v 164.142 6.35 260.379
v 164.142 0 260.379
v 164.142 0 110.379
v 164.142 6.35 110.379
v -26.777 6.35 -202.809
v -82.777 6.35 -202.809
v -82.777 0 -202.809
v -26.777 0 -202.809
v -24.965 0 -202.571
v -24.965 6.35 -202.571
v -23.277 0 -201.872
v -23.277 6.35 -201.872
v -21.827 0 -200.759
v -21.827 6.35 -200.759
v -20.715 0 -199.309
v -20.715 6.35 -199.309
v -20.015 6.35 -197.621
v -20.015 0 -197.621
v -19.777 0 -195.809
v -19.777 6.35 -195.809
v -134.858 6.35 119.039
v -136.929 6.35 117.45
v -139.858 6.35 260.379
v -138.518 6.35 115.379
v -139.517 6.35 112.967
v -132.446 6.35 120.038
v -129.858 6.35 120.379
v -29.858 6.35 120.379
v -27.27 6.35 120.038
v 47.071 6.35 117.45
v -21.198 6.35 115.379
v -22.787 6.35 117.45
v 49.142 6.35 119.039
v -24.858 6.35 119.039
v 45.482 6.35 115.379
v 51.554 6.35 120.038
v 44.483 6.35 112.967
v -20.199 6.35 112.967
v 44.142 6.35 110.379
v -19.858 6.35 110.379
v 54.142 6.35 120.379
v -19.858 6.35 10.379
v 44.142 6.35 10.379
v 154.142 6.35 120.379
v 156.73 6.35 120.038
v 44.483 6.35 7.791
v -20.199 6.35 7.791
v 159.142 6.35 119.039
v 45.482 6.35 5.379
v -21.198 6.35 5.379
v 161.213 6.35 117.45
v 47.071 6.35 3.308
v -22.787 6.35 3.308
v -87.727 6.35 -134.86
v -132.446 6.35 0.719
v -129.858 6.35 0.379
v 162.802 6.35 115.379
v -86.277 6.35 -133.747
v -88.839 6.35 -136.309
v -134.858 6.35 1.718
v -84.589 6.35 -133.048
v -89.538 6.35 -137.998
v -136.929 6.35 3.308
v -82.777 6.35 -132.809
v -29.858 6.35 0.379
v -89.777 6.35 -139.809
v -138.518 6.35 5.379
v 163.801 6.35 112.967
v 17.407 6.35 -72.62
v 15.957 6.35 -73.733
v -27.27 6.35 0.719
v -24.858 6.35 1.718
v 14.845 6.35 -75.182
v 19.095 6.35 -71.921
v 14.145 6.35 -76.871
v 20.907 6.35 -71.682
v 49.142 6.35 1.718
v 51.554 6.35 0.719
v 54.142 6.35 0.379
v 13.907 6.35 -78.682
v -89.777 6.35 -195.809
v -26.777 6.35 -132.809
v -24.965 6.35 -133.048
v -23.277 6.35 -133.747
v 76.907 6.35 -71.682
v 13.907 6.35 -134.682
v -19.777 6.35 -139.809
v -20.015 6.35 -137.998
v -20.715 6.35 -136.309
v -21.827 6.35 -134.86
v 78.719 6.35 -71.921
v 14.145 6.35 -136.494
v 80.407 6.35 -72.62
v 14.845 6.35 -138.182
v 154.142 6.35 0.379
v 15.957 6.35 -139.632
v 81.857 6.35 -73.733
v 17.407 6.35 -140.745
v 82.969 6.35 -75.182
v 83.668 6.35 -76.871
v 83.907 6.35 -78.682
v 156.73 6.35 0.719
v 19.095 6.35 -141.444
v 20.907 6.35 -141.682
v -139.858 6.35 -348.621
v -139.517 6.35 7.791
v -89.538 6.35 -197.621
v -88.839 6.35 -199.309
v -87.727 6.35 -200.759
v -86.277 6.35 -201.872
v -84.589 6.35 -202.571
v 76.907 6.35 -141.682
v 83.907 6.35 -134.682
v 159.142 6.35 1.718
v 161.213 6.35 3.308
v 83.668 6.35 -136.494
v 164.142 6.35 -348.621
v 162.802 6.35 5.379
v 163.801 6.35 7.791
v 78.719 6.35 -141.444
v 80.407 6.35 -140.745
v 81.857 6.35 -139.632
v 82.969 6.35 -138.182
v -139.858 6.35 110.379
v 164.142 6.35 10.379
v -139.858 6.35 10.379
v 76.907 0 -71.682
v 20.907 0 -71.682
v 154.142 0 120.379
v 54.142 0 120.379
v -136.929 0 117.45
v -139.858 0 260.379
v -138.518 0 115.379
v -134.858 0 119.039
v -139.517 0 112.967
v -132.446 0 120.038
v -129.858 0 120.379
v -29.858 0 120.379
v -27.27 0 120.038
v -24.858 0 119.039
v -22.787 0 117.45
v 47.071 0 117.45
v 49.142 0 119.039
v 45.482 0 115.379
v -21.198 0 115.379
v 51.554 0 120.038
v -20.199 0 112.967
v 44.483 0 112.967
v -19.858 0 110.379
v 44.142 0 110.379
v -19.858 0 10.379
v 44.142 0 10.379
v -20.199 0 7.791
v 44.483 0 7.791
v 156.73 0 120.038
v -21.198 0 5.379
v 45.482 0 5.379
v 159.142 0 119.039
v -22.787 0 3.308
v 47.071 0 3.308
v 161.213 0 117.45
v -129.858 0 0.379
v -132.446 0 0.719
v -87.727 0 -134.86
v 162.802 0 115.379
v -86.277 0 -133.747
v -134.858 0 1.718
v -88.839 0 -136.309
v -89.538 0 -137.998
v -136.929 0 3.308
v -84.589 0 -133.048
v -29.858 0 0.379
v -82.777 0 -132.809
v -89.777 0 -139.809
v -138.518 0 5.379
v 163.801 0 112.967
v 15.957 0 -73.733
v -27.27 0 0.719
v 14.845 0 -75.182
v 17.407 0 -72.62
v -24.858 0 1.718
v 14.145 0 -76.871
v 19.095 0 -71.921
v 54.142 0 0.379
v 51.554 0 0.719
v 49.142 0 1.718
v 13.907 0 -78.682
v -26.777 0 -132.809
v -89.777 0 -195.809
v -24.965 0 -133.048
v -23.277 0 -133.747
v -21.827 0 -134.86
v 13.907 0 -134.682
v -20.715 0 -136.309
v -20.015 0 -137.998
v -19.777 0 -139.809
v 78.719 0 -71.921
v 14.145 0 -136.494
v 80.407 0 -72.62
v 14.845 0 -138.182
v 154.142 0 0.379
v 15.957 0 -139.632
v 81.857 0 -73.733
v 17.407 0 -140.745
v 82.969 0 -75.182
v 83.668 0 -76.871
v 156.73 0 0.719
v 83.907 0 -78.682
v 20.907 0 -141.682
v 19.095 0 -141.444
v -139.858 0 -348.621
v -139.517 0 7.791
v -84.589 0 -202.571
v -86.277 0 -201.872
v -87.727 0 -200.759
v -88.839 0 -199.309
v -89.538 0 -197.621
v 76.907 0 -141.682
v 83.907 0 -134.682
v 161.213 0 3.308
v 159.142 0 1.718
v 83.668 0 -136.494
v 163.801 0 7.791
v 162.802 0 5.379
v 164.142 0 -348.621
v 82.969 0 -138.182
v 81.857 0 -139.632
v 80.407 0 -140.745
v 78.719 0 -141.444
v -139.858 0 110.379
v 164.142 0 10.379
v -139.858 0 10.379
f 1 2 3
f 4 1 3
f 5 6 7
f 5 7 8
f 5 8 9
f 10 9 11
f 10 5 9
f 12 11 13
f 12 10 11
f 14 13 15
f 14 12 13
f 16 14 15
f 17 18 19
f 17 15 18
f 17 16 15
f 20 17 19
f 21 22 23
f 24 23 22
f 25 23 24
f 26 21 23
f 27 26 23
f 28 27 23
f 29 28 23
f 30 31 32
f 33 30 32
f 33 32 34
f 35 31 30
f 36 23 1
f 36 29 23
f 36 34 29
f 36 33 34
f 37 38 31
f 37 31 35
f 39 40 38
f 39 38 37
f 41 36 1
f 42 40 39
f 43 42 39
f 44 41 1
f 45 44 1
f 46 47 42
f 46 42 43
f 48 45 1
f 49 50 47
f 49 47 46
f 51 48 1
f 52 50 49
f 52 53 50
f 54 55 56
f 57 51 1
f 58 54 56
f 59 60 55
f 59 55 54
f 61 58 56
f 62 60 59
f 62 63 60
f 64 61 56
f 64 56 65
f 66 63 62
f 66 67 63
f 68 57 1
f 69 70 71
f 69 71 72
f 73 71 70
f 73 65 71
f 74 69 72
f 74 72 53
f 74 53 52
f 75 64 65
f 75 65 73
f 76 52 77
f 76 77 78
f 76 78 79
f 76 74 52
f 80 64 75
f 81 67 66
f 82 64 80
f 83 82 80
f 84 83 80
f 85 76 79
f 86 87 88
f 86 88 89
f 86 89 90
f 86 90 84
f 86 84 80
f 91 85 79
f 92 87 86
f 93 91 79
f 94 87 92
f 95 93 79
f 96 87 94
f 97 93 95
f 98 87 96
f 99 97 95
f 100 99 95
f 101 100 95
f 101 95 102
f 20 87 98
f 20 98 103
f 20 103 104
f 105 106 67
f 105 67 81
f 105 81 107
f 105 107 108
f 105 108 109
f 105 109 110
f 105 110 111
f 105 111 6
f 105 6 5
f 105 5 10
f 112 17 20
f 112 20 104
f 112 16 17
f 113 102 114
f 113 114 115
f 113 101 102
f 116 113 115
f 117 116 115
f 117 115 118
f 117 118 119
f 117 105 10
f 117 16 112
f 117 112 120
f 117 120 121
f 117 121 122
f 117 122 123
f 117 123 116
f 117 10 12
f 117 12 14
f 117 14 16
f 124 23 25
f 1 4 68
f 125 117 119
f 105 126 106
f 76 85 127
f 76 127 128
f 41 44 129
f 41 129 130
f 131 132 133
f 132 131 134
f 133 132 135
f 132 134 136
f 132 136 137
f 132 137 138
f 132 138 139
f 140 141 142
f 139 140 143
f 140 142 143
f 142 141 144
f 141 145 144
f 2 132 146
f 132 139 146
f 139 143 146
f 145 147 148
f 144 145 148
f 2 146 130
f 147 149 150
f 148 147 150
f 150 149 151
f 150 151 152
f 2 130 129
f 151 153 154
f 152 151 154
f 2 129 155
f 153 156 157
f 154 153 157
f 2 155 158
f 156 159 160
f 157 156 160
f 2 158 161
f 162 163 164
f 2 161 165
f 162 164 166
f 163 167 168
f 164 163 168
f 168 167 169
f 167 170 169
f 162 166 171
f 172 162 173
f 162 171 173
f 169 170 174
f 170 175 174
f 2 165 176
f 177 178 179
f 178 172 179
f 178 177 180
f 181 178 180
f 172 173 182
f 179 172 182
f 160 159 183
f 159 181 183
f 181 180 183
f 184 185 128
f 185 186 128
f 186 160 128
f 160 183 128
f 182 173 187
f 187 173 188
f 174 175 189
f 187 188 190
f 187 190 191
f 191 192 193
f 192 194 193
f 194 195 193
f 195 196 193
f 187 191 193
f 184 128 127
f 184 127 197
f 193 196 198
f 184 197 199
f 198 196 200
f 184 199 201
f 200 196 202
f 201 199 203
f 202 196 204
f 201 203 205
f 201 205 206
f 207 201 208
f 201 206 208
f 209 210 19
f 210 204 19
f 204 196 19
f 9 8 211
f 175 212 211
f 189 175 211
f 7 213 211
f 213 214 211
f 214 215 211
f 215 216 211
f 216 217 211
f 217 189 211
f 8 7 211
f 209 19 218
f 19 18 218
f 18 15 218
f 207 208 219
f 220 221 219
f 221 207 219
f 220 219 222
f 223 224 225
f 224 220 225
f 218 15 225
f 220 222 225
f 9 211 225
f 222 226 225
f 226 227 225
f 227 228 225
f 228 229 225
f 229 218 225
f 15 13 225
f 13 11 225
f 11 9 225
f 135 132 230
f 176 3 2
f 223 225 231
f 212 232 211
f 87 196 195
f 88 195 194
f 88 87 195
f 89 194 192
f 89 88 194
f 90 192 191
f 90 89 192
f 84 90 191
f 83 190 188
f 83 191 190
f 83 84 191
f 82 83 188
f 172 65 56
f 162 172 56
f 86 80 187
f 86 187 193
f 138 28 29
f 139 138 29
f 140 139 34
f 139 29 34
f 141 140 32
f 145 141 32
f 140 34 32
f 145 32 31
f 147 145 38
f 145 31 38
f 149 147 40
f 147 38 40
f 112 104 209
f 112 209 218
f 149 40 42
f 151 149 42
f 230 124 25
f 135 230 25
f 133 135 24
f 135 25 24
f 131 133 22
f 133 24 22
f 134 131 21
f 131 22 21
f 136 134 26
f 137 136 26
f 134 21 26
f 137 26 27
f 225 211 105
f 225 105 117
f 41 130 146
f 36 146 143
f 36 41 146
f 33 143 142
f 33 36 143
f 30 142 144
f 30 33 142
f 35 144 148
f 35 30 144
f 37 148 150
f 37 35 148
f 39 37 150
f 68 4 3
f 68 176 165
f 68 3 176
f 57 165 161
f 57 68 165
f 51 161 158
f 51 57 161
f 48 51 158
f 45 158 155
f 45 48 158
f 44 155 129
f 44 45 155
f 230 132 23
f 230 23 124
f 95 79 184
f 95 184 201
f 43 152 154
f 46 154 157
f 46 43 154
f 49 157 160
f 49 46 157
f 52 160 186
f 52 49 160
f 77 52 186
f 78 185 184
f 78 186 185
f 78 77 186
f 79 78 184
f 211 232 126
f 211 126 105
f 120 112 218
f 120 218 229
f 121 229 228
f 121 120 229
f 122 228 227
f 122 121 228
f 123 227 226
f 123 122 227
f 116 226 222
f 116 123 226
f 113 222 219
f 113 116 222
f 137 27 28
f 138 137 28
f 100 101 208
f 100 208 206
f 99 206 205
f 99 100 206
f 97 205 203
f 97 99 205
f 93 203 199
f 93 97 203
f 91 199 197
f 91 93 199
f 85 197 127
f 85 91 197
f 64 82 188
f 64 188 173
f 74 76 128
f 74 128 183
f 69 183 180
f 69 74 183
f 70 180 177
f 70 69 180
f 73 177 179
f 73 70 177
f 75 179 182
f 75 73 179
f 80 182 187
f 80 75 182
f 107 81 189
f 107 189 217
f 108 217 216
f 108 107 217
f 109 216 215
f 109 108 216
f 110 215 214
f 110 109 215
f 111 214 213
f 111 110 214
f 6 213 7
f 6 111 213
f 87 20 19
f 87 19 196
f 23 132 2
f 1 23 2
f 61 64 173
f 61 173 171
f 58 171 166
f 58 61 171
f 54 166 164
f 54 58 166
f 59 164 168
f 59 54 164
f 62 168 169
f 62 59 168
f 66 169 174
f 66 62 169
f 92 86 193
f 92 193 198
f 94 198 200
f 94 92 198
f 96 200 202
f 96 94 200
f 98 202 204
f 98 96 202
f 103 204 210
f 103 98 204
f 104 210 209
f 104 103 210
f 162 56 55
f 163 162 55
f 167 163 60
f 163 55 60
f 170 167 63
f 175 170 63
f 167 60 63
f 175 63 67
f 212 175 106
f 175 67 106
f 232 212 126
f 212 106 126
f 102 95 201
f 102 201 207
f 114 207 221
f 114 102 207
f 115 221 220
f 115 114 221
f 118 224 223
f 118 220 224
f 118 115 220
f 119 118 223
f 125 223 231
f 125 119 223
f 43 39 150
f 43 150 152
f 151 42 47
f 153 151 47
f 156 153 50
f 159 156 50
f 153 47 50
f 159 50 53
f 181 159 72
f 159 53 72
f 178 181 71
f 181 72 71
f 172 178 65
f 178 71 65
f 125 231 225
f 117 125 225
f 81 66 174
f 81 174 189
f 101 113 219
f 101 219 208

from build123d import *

# Parameters (mm, degrees)
SKETCH1_W           = 304
SKETCH1_H           = 609
BOSS_EXTRUDE1_DEPTH = 6.35
CUT_EXTRUDE1_DEPTH  = 386.382582119
CUT_EXTRUDE3_DEPTH  = 386.382582119


with BuildPart() as part:
    # Sketch1 → Boss-Extrude1 (new body)
    with BuildSketch(Plane(origin=(0, 0, 0), x_dir=(1, 0, 0), z_dir=(0, 1, 0))):
        with Locations((12.142011834, 44.121301775)):
            Rectangle(SKETCH1_W, SKETCH1_H)
    extrude(amount=BOSS_EXTRUDE1_DEPTH)

    # Sketch3 → Cut-Extrude1 (cut, through all)
    with BuildSketch(Plane(origin=(0, 6.35, 0), x_dir=(1, 0, 0), z_dir=(0, 1, 0))):
        with BuildLine():
            Line((154.142011834, -120.378698225), (54.142011834, -120.378698225))
            ThreePointArc((54.142011834, -120.378698225), (47.070944022, -117.449766037), (44.142011834, -110.378698225))
            Line((44.142011834, -110.378698225), (44.142011834, -10.378698225))
            ThreePointArc((44.142011834, -10.378698225), (47.070944022, -3.307630413), (54.142011834, -0.378698225))
            Line((54.142011834, -0.378698225), (154.142011834, -0.378698225))
            ThreePointArc((154.142011834, -0.378698225), (161.213079646, -3.307630413), (164.142011834, -10.378698225))
            Line((164.142011834, -10.378698225), (164.142011834, -110.378698225))
            ThreePointArc((164.142011834, -110.378698225), (161.213079646, -117.449766037), (154.142011834, -120.378698225))
        make_face()
        with BuildLine():
            Line((-129.857988166, -120.378698225), (-29.857988166, -120.378698225))
            ThreePointArc((-29.857988166, -120.378698225), (-22.786920354, -117.449766037), (-19.857988166, -110.378698225))
            Line((-19.857988166, -110.378698225), (-19.857988166, -10.378698225))
            ThreePointArc((-19.857988166, -10.378698225), (-22.786920354, -3.307630413), (-29.857988166, -0.378698225))
            Line((-29.857988166, -0.378698225), (-129.857988166, -0.378698225))
            ThreePointArc((-129.857988166, -0.378698225), (-136.929055978, -3.307630413), (-139.857988166, -10.378698225))
            Line((-139.857988166, -10.378698225), (-139.857988166, -110.378698225))
            ThreePointArc((-139.857988166, -110.378698225), (-136.929055978, -117.449766037), (-129.857988166, -120.378698225))
        make_face()
    extrude(amount=-CUT_EXTRUDE1_DEPTH, mode=Mode.SUBTRACT)

    # Sketch4 → Cut-Extrude3 (cut, through all)
    with BuildSketch(Plane(origin=(0, 6.35, 0), x_dir=(1, 0, 0), z_dir=(0, 1, 0))):
        with BuildLine():
            Line((20.906944625, 141.682393226), (76.906944625, 141.682393226))
            ThreePointArc((76.906944625, 141.682393226), (81.856692093, 139.632140694), (83.906944625, 134.682393226))
            Line((83.906944625, 134.682393226), (83.906944625, 78.682393226))
            ThreePointArc((83.906944625, 78.682393226), (81.856692093, 73.732645757), (76.906944625, 71.682393226))
            Line((76.906944625, 71.682393226), (20.906944625, 71.682393226))
            ThreePointArc((20.906944625, 71.682393226), (15.957197157, 73.732645757), (13.906944625, 78.682393226))
            Line((13.906944625, 78.682393226), (13.906944625, 134.682393226))
            ThreePointArc((13.906944625, 134.682393226), (15.957197157, 139.632140694), (20.906944625, 141.682393226))
        make_face()
        with BuildLine():
            Line((-82.776888169, 202.809428977), (-26.776888169, 202.809428977))
            ThreePointArc((-26.776888169, 202.809428977), (-21.8271407, 200.759176445), (-19.776888169, 195.809428977))
            Line((-19.776888169, 195.809428977), (-19.776888169, 139.809428977))
            ThreePointArc((-19.776888169, 139.809428977), (-21.8271407, 134.859681509), (-26.776888169, 132.809428977))
            Line((-26.776888169, 132.809428977), (-82.776888169, 132.809428977))
            ThreePointArc((-82.776888169, 132.809428977), (-87.726635637, 134.859681509), (-89.776888169, 139.809428977))
            Line((-89.776888169, 139.809428977), (-89.776888169, 195.809428977))
            ThreePointArc((-89.776888169, 195.809428977), (-87.726635637, 200.759176445), (-82.776888169, 202.809428977))
        make_face()
    extrude(amount=-CUT_EXTRUDE3_DEPTH, mode=Mode.SUBTRACT)


solid = part.part
